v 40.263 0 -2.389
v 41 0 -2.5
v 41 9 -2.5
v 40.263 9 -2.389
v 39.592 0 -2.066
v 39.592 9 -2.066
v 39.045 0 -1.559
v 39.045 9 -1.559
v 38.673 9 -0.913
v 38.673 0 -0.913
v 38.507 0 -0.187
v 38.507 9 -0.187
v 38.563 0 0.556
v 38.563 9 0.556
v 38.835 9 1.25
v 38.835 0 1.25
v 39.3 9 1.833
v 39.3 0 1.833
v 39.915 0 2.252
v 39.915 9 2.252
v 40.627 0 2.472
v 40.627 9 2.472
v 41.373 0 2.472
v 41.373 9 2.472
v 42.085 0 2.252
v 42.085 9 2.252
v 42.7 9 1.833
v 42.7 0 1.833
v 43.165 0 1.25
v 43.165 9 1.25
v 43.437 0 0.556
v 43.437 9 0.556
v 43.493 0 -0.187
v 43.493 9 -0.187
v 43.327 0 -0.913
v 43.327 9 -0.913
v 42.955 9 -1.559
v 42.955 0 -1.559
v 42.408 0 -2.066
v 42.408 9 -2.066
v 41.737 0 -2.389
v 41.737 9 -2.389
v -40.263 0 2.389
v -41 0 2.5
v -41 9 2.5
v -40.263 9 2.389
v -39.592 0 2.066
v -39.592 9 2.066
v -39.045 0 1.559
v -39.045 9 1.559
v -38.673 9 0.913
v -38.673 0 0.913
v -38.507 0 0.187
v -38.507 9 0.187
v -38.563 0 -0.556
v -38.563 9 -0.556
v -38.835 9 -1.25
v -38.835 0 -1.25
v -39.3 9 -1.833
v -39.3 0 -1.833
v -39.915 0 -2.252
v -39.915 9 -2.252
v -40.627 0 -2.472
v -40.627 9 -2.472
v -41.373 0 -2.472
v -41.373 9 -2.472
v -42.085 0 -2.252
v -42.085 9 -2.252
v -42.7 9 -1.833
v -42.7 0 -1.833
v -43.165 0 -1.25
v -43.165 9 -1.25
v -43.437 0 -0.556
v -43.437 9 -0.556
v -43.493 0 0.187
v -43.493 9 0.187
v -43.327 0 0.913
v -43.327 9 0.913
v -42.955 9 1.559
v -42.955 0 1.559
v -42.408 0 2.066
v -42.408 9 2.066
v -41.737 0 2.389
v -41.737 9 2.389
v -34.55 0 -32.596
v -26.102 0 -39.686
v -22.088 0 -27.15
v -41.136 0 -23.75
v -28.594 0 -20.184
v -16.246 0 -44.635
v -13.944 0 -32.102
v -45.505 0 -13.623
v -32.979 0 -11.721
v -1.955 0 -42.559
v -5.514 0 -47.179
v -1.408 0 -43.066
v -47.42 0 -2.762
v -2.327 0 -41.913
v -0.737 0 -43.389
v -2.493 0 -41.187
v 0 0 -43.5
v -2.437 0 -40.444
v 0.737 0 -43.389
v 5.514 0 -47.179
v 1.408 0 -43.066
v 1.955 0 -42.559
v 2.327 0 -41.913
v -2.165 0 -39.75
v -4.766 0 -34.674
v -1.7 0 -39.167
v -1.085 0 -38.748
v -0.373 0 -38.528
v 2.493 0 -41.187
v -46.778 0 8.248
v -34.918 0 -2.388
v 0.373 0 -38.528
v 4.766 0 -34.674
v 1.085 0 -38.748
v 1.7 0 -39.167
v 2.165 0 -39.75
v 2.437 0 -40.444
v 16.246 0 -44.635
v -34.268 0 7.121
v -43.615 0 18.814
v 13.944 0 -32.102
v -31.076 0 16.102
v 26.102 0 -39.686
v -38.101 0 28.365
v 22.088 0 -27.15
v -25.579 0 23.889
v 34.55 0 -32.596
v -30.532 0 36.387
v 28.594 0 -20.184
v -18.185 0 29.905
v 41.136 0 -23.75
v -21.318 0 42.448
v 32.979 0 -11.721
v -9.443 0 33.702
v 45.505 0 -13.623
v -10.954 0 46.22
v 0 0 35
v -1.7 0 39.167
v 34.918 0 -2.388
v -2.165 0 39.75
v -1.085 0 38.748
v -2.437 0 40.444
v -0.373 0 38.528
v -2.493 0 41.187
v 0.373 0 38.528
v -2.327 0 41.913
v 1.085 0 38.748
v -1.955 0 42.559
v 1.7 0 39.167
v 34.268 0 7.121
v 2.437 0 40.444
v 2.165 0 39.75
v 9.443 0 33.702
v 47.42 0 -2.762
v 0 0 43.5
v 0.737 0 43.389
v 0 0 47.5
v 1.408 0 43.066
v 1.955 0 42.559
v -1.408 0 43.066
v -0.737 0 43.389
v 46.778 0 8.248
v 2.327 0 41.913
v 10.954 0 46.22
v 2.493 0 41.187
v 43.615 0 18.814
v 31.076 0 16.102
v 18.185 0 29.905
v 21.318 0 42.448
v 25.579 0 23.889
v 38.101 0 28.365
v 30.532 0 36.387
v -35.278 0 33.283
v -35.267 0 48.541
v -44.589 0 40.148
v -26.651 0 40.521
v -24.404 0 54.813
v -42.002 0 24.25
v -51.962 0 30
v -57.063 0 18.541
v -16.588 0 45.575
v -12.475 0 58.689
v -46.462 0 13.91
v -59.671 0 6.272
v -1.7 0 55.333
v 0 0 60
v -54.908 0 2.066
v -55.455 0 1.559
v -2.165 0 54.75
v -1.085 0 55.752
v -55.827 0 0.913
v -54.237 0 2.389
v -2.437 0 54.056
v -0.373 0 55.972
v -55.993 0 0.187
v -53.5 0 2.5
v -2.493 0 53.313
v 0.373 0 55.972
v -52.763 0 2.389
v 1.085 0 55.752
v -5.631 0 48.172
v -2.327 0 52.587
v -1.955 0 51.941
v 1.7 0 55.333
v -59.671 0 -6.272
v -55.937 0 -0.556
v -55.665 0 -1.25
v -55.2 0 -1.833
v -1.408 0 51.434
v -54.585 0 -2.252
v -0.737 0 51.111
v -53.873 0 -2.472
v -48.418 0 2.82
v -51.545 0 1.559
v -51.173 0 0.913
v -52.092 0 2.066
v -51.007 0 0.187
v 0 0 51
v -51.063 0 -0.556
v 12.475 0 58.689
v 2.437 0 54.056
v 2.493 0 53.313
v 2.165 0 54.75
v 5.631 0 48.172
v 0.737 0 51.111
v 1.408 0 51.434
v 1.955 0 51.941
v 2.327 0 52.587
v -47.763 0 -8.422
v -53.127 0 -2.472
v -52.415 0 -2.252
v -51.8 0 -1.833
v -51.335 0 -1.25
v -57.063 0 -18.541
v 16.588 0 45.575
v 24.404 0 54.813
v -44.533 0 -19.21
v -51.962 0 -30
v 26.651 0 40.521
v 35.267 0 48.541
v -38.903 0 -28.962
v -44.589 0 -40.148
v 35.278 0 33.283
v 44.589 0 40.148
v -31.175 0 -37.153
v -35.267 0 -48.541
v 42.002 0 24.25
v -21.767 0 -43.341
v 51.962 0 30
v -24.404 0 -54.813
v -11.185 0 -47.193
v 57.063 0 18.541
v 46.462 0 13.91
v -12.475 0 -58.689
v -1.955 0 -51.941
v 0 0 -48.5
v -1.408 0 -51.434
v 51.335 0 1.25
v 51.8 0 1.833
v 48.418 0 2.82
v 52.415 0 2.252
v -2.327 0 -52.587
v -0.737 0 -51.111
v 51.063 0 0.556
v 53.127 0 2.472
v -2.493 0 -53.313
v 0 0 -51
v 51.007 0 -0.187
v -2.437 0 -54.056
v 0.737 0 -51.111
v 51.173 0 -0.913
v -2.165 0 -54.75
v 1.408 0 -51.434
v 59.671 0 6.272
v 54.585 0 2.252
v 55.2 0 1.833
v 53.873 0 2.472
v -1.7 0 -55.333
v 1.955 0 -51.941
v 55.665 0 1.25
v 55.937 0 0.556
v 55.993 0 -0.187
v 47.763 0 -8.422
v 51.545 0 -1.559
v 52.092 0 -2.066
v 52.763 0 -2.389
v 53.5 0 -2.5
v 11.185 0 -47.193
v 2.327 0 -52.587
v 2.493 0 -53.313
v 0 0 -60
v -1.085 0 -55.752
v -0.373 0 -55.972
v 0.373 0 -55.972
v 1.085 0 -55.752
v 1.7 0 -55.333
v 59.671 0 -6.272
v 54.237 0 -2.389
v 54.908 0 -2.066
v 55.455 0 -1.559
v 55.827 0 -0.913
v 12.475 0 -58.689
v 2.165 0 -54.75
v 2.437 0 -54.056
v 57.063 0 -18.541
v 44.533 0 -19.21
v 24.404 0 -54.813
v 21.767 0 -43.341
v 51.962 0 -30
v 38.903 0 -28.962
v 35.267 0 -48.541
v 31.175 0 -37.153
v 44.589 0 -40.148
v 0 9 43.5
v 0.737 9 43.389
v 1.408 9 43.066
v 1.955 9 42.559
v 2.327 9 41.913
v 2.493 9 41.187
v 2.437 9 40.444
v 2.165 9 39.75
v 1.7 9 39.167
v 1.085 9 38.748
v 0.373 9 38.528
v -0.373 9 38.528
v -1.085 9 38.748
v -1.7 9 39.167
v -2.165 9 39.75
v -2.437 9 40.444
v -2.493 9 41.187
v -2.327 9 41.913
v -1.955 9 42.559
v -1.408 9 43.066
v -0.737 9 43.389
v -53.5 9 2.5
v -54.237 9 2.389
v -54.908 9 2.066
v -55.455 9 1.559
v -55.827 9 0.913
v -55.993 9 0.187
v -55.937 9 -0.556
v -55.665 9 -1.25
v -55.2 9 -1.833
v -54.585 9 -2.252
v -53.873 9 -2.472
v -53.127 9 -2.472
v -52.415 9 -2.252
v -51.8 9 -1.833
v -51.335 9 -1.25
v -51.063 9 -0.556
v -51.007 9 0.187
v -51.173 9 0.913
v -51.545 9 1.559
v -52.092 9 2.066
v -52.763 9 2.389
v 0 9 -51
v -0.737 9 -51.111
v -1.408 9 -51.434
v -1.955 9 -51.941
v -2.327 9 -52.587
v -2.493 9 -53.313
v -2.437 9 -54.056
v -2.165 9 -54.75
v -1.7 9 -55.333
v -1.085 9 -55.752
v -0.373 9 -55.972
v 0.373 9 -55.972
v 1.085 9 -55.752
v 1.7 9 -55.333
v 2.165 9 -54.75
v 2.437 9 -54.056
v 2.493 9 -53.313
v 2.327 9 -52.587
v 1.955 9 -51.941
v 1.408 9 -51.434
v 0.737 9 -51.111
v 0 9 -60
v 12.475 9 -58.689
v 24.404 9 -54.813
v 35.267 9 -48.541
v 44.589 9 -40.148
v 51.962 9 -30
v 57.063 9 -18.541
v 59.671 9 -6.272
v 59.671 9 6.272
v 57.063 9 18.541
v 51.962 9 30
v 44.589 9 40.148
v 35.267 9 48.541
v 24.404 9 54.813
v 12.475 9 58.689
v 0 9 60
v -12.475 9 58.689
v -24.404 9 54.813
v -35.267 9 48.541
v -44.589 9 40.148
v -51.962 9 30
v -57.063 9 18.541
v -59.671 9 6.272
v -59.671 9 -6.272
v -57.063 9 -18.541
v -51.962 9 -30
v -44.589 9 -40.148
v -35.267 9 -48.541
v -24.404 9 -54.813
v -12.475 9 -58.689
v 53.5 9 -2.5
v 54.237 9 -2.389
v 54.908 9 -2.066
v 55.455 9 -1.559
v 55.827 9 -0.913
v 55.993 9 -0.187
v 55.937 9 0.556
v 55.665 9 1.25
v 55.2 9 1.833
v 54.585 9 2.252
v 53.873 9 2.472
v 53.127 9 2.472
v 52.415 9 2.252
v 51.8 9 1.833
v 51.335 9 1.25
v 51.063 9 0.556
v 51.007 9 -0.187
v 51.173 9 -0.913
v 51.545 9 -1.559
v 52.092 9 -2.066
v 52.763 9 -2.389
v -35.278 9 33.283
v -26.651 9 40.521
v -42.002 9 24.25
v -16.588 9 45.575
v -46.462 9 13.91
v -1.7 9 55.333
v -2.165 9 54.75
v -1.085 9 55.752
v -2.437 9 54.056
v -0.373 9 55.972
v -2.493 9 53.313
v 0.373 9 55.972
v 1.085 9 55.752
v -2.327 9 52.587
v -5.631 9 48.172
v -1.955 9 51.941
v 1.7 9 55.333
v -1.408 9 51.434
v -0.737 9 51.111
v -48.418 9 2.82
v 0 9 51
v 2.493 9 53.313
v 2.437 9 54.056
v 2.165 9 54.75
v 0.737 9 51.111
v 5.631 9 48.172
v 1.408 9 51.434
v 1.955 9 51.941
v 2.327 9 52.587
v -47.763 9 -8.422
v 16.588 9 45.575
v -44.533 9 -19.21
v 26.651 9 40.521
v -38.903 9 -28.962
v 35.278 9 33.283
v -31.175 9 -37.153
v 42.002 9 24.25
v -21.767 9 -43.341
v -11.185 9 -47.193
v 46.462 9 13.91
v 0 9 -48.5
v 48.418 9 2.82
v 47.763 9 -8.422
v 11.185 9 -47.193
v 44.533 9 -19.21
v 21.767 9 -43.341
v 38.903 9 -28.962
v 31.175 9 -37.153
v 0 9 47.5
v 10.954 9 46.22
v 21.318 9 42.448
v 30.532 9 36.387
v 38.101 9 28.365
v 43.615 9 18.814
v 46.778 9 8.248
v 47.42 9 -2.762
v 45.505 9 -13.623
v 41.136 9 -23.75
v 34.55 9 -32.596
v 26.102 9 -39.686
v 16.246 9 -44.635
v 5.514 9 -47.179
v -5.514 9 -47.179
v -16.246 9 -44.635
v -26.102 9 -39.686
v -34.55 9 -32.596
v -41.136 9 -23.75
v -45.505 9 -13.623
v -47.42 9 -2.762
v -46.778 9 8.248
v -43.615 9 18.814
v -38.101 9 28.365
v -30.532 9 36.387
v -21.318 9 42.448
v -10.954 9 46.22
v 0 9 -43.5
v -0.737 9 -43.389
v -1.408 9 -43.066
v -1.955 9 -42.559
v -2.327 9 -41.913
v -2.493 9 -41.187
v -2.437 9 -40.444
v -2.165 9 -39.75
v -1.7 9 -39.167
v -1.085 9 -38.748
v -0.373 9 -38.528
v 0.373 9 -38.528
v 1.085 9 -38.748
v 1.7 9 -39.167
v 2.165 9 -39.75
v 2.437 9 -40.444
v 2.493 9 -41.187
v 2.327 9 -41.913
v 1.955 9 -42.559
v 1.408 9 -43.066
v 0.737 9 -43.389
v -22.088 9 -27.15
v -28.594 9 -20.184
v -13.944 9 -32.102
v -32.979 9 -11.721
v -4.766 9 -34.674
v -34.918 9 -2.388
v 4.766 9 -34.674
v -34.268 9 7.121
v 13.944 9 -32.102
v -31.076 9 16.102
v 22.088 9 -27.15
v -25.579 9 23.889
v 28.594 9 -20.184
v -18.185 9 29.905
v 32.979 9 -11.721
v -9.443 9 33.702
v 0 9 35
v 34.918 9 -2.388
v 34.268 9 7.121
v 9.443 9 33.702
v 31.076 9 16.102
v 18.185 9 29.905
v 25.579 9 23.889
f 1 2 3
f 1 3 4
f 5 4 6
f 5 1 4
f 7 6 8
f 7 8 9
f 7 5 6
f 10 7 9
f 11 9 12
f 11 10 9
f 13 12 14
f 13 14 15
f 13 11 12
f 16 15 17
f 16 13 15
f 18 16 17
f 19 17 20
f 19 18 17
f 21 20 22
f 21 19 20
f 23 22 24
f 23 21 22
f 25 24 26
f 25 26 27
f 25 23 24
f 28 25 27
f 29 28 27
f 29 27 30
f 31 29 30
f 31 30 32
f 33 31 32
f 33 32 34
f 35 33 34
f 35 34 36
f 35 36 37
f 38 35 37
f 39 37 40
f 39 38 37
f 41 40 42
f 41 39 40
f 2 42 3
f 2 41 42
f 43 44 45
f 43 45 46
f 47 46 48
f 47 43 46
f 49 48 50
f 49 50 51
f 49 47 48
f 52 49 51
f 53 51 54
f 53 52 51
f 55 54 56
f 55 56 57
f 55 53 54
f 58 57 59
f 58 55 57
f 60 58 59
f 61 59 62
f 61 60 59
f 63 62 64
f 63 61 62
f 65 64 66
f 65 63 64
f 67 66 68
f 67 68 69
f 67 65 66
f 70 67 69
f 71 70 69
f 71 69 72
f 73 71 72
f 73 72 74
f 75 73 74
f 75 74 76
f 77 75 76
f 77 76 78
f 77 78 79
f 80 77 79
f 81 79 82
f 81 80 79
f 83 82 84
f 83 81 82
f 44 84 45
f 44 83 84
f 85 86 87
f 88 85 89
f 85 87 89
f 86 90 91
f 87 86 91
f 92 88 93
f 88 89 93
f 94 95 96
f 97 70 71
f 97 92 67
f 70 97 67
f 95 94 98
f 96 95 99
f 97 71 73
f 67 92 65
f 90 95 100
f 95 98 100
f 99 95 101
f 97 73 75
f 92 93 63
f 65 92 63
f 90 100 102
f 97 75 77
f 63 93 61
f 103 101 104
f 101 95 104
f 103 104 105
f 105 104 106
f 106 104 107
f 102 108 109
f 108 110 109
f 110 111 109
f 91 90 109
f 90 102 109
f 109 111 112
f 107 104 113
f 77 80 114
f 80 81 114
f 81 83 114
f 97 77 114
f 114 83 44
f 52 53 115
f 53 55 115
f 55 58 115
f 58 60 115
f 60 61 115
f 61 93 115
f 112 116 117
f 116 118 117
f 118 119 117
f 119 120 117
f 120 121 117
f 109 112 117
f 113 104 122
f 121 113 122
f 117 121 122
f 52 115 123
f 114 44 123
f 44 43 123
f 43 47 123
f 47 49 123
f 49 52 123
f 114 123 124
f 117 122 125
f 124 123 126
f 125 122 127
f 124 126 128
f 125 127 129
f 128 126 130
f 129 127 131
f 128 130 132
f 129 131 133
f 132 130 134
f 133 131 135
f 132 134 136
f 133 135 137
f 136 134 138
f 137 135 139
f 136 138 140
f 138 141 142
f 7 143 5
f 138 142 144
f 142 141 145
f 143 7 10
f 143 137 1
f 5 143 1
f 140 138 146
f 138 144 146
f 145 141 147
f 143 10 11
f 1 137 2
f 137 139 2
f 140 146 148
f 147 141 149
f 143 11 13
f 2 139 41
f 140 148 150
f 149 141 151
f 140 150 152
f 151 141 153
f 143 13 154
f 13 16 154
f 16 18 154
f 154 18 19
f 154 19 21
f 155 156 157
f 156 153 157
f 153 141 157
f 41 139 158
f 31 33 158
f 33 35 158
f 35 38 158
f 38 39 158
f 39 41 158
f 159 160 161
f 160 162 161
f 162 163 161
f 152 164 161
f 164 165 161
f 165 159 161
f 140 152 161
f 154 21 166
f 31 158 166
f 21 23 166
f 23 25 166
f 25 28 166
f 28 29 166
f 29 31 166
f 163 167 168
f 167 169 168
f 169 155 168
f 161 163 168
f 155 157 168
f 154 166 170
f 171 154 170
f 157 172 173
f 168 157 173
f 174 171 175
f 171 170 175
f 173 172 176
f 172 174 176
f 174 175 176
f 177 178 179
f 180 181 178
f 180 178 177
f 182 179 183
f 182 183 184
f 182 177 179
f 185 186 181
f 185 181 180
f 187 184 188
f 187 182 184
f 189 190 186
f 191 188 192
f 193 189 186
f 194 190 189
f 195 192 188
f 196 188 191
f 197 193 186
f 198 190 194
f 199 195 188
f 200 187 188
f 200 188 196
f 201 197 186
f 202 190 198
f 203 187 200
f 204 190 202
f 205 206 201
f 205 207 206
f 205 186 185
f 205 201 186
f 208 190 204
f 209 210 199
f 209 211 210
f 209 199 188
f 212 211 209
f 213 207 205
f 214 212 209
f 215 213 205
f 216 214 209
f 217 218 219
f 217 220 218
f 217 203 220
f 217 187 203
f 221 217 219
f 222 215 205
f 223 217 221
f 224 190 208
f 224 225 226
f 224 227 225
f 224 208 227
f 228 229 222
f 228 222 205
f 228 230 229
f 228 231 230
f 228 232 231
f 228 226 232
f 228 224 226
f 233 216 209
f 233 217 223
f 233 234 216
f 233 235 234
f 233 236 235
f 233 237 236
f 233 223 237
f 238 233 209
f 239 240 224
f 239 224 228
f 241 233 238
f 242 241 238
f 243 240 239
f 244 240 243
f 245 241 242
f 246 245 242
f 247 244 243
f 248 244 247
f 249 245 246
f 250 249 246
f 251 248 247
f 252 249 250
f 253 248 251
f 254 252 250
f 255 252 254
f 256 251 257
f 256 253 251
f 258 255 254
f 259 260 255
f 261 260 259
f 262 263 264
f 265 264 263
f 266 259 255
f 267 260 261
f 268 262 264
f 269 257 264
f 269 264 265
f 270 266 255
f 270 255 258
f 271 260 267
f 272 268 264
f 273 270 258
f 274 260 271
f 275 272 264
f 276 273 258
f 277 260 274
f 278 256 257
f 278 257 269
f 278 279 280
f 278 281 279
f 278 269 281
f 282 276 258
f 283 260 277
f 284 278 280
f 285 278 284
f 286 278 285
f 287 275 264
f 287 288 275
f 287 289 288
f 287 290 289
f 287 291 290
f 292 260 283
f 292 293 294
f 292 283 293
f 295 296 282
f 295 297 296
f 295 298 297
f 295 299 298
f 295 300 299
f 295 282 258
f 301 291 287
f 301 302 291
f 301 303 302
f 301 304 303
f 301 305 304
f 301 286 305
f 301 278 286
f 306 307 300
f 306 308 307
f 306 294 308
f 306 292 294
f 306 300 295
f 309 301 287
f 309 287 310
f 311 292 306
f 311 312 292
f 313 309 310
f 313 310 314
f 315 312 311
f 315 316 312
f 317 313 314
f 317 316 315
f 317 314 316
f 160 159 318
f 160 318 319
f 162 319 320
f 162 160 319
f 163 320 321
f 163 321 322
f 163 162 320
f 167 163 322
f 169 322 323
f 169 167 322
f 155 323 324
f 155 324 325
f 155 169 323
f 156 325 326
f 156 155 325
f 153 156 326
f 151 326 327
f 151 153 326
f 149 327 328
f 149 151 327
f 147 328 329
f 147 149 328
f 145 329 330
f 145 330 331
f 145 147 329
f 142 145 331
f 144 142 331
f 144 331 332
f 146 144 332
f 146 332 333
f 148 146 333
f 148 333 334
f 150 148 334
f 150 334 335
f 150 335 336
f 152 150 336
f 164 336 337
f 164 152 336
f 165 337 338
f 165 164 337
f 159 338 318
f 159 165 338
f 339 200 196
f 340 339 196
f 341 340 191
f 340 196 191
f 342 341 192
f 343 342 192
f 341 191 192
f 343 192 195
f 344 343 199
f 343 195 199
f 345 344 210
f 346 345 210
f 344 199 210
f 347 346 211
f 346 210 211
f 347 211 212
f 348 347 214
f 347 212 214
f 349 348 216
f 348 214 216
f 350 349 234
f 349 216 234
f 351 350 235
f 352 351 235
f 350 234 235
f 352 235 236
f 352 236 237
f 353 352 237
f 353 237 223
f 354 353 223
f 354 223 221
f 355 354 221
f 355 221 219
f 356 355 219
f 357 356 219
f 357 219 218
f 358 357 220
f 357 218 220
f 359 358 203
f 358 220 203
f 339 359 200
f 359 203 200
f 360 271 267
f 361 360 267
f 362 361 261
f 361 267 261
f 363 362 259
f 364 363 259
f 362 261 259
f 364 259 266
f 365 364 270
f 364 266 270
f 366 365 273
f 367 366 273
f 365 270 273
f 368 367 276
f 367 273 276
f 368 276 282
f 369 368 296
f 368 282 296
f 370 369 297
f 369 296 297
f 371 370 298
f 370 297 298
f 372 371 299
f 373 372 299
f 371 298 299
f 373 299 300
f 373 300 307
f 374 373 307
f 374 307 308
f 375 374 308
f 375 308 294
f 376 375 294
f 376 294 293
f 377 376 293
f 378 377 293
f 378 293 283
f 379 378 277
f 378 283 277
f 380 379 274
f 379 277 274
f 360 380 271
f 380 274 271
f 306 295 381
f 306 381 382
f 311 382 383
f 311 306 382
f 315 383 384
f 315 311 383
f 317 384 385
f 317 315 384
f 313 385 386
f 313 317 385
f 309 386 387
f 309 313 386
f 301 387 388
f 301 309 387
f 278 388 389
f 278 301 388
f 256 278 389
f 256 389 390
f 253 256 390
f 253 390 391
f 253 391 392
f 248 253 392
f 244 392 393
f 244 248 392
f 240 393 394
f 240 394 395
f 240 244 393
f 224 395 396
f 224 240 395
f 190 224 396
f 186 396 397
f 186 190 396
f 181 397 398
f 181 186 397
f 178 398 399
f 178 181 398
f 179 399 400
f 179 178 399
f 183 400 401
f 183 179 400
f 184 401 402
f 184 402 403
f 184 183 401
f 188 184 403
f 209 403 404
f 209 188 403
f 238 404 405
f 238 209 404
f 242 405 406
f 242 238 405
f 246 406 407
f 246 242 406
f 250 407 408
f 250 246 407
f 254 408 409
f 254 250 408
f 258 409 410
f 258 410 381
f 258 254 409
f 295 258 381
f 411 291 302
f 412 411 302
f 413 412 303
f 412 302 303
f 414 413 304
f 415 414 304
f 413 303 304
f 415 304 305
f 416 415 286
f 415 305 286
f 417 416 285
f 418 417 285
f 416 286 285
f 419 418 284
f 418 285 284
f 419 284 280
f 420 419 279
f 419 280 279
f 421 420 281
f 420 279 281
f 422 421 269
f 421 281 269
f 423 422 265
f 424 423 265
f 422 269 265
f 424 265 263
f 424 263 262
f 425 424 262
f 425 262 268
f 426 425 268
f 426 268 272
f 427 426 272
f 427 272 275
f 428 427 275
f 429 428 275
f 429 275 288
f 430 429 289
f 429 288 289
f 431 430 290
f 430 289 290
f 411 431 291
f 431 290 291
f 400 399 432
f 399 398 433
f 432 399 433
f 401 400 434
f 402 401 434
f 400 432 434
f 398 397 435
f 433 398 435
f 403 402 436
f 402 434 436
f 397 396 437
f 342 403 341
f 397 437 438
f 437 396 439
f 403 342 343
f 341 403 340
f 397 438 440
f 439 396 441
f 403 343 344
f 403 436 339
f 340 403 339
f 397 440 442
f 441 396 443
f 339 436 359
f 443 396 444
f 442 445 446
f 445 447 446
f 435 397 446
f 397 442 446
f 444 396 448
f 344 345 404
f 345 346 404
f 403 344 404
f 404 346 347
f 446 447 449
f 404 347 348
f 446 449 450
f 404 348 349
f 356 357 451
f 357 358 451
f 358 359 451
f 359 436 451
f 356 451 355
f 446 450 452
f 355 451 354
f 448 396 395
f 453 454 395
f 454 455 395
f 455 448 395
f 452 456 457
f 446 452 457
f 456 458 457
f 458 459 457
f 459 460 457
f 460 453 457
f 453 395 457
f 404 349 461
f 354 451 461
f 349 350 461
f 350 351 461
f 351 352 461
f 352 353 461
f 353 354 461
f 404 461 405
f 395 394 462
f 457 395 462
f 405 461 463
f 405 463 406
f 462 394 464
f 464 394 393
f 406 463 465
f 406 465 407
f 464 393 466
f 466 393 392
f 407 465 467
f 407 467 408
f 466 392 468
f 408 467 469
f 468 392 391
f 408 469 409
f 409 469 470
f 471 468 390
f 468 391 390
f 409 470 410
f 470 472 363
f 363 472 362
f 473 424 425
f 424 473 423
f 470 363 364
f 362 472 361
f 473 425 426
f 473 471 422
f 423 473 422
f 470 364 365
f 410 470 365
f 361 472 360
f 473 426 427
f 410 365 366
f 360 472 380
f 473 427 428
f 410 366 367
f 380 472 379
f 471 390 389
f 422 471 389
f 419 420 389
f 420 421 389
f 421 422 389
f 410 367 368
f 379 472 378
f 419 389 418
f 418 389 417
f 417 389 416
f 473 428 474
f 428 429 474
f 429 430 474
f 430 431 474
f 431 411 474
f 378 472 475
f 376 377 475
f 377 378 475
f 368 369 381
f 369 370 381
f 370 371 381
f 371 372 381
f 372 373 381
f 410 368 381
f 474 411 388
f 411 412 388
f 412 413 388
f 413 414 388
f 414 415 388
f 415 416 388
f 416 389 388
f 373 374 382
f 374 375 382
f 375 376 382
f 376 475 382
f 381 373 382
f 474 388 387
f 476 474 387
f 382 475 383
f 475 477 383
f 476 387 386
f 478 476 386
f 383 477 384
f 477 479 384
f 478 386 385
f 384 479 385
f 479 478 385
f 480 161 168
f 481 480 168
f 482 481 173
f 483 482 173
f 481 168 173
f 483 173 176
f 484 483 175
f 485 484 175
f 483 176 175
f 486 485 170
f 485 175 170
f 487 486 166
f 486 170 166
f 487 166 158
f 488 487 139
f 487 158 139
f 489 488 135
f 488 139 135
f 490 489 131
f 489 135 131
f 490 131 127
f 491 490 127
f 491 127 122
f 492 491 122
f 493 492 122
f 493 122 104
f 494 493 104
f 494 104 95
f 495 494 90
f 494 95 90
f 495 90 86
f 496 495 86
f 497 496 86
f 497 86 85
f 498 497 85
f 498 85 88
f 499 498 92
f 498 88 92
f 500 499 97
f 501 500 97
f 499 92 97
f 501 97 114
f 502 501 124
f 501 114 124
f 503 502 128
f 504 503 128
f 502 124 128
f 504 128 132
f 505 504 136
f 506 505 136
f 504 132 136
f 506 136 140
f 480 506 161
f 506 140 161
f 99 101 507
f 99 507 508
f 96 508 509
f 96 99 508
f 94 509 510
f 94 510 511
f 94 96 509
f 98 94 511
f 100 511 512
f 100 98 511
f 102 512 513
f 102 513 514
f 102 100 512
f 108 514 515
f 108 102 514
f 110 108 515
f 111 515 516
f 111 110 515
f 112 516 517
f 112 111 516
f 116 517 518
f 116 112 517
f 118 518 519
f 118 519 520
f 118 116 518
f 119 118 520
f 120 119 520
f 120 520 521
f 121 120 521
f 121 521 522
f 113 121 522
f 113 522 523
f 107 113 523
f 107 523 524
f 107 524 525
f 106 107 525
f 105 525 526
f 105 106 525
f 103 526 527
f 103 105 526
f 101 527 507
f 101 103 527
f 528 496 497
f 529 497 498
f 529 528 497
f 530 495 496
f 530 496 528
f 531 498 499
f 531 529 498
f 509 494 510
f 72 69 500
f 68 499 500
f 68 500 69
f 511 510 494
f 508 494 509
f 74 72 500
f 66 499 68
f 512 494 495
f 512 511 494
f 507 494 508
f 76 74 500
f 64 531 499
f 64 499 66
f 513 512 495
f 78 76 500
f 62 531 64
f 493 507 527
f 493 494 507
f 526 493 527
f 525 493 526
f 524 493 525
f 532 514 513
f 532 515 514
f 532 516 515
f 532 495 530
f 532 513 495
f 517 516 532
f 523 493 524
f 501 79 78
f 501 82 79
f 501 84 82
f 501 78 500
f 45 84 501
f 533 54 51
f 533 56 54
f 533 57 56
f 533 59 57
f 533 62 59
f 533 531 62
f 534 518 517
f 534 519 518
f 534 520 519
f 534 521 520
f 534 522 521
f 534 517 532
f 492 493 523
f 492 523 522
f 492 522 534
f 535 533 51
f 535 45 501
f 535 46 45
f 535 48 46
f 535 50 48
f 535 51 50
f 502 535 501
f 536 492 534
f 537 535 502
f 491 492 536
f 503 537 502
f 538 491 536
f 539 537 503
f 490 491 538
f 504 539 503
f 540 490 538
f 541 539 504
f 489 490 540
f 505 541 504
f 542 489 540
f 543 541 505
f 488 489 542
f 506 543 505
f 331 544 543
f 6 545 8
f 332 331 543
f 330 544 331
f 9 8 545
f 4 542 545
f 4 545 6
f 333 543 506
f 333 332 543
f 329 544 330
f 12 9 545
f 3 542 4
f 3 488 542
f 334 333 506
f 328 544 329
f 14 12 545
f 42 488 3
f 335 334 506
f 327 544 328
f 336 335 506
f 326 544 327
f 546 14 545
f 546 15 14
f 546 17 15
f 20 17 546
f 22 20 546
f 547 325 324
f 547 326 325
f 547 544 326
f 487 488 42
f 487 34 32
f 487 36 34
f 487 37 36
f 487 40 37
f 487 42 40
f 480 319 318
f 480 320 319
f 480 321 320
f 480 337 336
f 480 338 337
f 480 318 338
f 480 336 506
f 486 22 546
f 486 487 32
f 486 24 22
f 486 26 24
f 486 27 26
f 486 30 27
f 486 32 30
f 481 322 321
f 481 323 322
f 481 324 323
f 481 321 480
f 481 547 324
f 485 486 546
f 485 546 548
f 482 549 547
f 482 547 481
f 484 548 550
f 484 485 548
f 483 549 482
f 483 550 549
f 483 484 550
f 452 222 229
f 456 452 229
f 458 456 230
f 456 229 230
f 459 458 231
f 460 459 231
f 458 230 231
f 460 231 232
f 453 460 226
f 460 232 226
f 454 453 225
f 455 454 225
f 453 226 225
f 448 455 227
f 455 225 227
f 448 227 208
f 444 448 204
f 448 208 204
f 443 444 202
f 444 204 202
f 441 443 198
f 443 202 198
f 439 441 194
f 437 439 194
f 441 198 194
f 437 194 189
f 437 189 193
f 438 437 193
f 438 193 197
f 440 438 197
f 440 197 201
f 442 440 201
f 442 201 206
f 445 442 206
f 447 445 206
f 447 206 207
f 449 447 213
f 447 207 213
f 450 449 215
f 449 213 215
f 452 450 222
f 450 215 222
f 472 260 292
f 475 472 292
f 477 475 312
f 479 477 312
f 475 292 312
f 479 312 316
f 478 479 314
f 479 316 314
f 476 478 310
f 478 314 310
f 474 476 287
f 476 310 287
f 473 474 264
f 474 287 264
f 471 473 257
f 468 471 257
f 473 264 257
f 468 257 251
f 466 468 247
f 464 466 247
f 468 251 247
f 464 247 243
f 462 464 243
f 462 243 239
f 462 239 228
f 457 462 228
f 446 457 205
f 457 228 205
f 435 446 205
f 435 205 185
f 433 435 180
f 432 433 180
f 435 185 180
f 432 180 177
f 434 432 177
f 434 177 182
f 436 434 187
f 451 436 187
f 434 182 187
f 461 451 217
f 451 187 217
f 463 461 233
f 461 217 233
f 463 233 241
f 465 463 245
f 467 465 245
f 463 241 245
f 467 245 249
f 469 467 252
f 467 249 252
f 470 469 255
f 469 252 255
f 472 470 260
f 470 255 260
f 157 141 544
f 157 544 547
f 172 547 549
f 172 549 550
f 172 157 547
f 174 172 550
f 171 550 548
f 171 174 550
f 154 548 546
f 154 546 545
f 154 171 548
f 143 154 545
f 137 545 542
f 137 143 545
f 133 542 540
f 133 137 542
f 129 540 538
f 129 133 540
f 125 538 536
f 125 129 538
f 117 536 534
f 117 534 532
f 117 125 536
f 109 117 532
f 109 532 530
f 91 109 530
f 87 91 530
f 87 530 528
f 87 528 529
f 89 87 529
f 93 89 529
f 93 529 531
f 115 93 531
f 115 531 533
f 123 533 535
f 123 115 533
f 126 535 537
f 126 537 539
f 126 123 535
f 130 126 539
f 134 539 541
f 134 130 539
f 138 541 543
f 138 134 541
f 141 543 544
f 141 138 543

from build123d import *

# Parameters (mm, degrees)
SKETCH_1_R      = 47.5
SKETCH_1_R_2    = 35
SKETCH_1_R_3    = 2.5
EXTRUDE_1_DEPTH = 9
SKETCH_2_R      = 60
SKETCH_2_R_2    = 48.5
SKETCH_2_R_3    = 2.5
EXTRUDE_2_DEPTH = 9


with BuildPart() as part:
    # 草图1 → 凸台-拉伸1 (new body)
    with BuildSketch(Plane(origin=(0, 0, 0), x_dir=(1, 0, 0), z_dir=(0, 1, 0))):
        with Locations(Location((0, 0, 0), (0, 0, 270))):
            Circle(SKETCH_1_R)
        with Locations(Location((0, 0, 0), (0, 0, 270))):
            Circle(SKETCH_1_R_2, mode=Mode.SUBTRACT)
        with Locations(Location((-41, 0, 0), (0, 0, 270))):
            Circle(SKETCH_1_R_3, mode=Mode.SUBTRACT)
        with Locations(Location((41, 0, 0), (0, 0, 90))):
            Circle(SKETCH_1_R_3, mode=Mode.SUBTRACT)
        with Locations(Location((0, -41, 0), (0, 0, 270))):
            Circle(SKETCH_1_R_3, mode=Mode.SUBTRACT)
        with Locations(Location((0, 41, 0), (0, 0, 90))):
            Circle(SKETCH_1_R_3, mode=Mode.SUBTRACT)
    extrude(amount=EXTRUDE_1_DEPTH)


with BuildPart() as body_2:
    # 草图2 → 凸台-拉伸2 (new body)
    with BuildSketch(Plane.XZ):
        with Locations(Location((0, 0, 0), (0, 0, 270))):
            Circle(SKETCH_2_R)
        with Locations(Location((0, 0, 0), (0, 0, 270))):
            Circle(SKETCH_2_R_2, mode=Mode.SUBTRACT)
        with Locations(Location((0, 53.5, 0), (0, 0, 270))):
            Circle(SKETCH_2_R_3, mode=Mode.SUBTRACT)
        with Locations(Location((-53.5, 0, 0), (0, 0, 90))):
            Circle(SKETCH_2_R_3, mode=Mode.SUBTRACT)
        with Locations(Location((0, -53.5, 0), (0, 0, 90))):
            Circle(SKETCH_2_R_3, mode=Mode.SUBTRACT)
        with Locations(Location((53.5, 0, 0), (0, 0, 270))):
            Circle(SKETCH_2_R_3, mode=Mode.SUBTRACT)
    extrude(amount=-EXTRUDE_2_DEPTH)


solid = Compound([part.part, body_2.part])
